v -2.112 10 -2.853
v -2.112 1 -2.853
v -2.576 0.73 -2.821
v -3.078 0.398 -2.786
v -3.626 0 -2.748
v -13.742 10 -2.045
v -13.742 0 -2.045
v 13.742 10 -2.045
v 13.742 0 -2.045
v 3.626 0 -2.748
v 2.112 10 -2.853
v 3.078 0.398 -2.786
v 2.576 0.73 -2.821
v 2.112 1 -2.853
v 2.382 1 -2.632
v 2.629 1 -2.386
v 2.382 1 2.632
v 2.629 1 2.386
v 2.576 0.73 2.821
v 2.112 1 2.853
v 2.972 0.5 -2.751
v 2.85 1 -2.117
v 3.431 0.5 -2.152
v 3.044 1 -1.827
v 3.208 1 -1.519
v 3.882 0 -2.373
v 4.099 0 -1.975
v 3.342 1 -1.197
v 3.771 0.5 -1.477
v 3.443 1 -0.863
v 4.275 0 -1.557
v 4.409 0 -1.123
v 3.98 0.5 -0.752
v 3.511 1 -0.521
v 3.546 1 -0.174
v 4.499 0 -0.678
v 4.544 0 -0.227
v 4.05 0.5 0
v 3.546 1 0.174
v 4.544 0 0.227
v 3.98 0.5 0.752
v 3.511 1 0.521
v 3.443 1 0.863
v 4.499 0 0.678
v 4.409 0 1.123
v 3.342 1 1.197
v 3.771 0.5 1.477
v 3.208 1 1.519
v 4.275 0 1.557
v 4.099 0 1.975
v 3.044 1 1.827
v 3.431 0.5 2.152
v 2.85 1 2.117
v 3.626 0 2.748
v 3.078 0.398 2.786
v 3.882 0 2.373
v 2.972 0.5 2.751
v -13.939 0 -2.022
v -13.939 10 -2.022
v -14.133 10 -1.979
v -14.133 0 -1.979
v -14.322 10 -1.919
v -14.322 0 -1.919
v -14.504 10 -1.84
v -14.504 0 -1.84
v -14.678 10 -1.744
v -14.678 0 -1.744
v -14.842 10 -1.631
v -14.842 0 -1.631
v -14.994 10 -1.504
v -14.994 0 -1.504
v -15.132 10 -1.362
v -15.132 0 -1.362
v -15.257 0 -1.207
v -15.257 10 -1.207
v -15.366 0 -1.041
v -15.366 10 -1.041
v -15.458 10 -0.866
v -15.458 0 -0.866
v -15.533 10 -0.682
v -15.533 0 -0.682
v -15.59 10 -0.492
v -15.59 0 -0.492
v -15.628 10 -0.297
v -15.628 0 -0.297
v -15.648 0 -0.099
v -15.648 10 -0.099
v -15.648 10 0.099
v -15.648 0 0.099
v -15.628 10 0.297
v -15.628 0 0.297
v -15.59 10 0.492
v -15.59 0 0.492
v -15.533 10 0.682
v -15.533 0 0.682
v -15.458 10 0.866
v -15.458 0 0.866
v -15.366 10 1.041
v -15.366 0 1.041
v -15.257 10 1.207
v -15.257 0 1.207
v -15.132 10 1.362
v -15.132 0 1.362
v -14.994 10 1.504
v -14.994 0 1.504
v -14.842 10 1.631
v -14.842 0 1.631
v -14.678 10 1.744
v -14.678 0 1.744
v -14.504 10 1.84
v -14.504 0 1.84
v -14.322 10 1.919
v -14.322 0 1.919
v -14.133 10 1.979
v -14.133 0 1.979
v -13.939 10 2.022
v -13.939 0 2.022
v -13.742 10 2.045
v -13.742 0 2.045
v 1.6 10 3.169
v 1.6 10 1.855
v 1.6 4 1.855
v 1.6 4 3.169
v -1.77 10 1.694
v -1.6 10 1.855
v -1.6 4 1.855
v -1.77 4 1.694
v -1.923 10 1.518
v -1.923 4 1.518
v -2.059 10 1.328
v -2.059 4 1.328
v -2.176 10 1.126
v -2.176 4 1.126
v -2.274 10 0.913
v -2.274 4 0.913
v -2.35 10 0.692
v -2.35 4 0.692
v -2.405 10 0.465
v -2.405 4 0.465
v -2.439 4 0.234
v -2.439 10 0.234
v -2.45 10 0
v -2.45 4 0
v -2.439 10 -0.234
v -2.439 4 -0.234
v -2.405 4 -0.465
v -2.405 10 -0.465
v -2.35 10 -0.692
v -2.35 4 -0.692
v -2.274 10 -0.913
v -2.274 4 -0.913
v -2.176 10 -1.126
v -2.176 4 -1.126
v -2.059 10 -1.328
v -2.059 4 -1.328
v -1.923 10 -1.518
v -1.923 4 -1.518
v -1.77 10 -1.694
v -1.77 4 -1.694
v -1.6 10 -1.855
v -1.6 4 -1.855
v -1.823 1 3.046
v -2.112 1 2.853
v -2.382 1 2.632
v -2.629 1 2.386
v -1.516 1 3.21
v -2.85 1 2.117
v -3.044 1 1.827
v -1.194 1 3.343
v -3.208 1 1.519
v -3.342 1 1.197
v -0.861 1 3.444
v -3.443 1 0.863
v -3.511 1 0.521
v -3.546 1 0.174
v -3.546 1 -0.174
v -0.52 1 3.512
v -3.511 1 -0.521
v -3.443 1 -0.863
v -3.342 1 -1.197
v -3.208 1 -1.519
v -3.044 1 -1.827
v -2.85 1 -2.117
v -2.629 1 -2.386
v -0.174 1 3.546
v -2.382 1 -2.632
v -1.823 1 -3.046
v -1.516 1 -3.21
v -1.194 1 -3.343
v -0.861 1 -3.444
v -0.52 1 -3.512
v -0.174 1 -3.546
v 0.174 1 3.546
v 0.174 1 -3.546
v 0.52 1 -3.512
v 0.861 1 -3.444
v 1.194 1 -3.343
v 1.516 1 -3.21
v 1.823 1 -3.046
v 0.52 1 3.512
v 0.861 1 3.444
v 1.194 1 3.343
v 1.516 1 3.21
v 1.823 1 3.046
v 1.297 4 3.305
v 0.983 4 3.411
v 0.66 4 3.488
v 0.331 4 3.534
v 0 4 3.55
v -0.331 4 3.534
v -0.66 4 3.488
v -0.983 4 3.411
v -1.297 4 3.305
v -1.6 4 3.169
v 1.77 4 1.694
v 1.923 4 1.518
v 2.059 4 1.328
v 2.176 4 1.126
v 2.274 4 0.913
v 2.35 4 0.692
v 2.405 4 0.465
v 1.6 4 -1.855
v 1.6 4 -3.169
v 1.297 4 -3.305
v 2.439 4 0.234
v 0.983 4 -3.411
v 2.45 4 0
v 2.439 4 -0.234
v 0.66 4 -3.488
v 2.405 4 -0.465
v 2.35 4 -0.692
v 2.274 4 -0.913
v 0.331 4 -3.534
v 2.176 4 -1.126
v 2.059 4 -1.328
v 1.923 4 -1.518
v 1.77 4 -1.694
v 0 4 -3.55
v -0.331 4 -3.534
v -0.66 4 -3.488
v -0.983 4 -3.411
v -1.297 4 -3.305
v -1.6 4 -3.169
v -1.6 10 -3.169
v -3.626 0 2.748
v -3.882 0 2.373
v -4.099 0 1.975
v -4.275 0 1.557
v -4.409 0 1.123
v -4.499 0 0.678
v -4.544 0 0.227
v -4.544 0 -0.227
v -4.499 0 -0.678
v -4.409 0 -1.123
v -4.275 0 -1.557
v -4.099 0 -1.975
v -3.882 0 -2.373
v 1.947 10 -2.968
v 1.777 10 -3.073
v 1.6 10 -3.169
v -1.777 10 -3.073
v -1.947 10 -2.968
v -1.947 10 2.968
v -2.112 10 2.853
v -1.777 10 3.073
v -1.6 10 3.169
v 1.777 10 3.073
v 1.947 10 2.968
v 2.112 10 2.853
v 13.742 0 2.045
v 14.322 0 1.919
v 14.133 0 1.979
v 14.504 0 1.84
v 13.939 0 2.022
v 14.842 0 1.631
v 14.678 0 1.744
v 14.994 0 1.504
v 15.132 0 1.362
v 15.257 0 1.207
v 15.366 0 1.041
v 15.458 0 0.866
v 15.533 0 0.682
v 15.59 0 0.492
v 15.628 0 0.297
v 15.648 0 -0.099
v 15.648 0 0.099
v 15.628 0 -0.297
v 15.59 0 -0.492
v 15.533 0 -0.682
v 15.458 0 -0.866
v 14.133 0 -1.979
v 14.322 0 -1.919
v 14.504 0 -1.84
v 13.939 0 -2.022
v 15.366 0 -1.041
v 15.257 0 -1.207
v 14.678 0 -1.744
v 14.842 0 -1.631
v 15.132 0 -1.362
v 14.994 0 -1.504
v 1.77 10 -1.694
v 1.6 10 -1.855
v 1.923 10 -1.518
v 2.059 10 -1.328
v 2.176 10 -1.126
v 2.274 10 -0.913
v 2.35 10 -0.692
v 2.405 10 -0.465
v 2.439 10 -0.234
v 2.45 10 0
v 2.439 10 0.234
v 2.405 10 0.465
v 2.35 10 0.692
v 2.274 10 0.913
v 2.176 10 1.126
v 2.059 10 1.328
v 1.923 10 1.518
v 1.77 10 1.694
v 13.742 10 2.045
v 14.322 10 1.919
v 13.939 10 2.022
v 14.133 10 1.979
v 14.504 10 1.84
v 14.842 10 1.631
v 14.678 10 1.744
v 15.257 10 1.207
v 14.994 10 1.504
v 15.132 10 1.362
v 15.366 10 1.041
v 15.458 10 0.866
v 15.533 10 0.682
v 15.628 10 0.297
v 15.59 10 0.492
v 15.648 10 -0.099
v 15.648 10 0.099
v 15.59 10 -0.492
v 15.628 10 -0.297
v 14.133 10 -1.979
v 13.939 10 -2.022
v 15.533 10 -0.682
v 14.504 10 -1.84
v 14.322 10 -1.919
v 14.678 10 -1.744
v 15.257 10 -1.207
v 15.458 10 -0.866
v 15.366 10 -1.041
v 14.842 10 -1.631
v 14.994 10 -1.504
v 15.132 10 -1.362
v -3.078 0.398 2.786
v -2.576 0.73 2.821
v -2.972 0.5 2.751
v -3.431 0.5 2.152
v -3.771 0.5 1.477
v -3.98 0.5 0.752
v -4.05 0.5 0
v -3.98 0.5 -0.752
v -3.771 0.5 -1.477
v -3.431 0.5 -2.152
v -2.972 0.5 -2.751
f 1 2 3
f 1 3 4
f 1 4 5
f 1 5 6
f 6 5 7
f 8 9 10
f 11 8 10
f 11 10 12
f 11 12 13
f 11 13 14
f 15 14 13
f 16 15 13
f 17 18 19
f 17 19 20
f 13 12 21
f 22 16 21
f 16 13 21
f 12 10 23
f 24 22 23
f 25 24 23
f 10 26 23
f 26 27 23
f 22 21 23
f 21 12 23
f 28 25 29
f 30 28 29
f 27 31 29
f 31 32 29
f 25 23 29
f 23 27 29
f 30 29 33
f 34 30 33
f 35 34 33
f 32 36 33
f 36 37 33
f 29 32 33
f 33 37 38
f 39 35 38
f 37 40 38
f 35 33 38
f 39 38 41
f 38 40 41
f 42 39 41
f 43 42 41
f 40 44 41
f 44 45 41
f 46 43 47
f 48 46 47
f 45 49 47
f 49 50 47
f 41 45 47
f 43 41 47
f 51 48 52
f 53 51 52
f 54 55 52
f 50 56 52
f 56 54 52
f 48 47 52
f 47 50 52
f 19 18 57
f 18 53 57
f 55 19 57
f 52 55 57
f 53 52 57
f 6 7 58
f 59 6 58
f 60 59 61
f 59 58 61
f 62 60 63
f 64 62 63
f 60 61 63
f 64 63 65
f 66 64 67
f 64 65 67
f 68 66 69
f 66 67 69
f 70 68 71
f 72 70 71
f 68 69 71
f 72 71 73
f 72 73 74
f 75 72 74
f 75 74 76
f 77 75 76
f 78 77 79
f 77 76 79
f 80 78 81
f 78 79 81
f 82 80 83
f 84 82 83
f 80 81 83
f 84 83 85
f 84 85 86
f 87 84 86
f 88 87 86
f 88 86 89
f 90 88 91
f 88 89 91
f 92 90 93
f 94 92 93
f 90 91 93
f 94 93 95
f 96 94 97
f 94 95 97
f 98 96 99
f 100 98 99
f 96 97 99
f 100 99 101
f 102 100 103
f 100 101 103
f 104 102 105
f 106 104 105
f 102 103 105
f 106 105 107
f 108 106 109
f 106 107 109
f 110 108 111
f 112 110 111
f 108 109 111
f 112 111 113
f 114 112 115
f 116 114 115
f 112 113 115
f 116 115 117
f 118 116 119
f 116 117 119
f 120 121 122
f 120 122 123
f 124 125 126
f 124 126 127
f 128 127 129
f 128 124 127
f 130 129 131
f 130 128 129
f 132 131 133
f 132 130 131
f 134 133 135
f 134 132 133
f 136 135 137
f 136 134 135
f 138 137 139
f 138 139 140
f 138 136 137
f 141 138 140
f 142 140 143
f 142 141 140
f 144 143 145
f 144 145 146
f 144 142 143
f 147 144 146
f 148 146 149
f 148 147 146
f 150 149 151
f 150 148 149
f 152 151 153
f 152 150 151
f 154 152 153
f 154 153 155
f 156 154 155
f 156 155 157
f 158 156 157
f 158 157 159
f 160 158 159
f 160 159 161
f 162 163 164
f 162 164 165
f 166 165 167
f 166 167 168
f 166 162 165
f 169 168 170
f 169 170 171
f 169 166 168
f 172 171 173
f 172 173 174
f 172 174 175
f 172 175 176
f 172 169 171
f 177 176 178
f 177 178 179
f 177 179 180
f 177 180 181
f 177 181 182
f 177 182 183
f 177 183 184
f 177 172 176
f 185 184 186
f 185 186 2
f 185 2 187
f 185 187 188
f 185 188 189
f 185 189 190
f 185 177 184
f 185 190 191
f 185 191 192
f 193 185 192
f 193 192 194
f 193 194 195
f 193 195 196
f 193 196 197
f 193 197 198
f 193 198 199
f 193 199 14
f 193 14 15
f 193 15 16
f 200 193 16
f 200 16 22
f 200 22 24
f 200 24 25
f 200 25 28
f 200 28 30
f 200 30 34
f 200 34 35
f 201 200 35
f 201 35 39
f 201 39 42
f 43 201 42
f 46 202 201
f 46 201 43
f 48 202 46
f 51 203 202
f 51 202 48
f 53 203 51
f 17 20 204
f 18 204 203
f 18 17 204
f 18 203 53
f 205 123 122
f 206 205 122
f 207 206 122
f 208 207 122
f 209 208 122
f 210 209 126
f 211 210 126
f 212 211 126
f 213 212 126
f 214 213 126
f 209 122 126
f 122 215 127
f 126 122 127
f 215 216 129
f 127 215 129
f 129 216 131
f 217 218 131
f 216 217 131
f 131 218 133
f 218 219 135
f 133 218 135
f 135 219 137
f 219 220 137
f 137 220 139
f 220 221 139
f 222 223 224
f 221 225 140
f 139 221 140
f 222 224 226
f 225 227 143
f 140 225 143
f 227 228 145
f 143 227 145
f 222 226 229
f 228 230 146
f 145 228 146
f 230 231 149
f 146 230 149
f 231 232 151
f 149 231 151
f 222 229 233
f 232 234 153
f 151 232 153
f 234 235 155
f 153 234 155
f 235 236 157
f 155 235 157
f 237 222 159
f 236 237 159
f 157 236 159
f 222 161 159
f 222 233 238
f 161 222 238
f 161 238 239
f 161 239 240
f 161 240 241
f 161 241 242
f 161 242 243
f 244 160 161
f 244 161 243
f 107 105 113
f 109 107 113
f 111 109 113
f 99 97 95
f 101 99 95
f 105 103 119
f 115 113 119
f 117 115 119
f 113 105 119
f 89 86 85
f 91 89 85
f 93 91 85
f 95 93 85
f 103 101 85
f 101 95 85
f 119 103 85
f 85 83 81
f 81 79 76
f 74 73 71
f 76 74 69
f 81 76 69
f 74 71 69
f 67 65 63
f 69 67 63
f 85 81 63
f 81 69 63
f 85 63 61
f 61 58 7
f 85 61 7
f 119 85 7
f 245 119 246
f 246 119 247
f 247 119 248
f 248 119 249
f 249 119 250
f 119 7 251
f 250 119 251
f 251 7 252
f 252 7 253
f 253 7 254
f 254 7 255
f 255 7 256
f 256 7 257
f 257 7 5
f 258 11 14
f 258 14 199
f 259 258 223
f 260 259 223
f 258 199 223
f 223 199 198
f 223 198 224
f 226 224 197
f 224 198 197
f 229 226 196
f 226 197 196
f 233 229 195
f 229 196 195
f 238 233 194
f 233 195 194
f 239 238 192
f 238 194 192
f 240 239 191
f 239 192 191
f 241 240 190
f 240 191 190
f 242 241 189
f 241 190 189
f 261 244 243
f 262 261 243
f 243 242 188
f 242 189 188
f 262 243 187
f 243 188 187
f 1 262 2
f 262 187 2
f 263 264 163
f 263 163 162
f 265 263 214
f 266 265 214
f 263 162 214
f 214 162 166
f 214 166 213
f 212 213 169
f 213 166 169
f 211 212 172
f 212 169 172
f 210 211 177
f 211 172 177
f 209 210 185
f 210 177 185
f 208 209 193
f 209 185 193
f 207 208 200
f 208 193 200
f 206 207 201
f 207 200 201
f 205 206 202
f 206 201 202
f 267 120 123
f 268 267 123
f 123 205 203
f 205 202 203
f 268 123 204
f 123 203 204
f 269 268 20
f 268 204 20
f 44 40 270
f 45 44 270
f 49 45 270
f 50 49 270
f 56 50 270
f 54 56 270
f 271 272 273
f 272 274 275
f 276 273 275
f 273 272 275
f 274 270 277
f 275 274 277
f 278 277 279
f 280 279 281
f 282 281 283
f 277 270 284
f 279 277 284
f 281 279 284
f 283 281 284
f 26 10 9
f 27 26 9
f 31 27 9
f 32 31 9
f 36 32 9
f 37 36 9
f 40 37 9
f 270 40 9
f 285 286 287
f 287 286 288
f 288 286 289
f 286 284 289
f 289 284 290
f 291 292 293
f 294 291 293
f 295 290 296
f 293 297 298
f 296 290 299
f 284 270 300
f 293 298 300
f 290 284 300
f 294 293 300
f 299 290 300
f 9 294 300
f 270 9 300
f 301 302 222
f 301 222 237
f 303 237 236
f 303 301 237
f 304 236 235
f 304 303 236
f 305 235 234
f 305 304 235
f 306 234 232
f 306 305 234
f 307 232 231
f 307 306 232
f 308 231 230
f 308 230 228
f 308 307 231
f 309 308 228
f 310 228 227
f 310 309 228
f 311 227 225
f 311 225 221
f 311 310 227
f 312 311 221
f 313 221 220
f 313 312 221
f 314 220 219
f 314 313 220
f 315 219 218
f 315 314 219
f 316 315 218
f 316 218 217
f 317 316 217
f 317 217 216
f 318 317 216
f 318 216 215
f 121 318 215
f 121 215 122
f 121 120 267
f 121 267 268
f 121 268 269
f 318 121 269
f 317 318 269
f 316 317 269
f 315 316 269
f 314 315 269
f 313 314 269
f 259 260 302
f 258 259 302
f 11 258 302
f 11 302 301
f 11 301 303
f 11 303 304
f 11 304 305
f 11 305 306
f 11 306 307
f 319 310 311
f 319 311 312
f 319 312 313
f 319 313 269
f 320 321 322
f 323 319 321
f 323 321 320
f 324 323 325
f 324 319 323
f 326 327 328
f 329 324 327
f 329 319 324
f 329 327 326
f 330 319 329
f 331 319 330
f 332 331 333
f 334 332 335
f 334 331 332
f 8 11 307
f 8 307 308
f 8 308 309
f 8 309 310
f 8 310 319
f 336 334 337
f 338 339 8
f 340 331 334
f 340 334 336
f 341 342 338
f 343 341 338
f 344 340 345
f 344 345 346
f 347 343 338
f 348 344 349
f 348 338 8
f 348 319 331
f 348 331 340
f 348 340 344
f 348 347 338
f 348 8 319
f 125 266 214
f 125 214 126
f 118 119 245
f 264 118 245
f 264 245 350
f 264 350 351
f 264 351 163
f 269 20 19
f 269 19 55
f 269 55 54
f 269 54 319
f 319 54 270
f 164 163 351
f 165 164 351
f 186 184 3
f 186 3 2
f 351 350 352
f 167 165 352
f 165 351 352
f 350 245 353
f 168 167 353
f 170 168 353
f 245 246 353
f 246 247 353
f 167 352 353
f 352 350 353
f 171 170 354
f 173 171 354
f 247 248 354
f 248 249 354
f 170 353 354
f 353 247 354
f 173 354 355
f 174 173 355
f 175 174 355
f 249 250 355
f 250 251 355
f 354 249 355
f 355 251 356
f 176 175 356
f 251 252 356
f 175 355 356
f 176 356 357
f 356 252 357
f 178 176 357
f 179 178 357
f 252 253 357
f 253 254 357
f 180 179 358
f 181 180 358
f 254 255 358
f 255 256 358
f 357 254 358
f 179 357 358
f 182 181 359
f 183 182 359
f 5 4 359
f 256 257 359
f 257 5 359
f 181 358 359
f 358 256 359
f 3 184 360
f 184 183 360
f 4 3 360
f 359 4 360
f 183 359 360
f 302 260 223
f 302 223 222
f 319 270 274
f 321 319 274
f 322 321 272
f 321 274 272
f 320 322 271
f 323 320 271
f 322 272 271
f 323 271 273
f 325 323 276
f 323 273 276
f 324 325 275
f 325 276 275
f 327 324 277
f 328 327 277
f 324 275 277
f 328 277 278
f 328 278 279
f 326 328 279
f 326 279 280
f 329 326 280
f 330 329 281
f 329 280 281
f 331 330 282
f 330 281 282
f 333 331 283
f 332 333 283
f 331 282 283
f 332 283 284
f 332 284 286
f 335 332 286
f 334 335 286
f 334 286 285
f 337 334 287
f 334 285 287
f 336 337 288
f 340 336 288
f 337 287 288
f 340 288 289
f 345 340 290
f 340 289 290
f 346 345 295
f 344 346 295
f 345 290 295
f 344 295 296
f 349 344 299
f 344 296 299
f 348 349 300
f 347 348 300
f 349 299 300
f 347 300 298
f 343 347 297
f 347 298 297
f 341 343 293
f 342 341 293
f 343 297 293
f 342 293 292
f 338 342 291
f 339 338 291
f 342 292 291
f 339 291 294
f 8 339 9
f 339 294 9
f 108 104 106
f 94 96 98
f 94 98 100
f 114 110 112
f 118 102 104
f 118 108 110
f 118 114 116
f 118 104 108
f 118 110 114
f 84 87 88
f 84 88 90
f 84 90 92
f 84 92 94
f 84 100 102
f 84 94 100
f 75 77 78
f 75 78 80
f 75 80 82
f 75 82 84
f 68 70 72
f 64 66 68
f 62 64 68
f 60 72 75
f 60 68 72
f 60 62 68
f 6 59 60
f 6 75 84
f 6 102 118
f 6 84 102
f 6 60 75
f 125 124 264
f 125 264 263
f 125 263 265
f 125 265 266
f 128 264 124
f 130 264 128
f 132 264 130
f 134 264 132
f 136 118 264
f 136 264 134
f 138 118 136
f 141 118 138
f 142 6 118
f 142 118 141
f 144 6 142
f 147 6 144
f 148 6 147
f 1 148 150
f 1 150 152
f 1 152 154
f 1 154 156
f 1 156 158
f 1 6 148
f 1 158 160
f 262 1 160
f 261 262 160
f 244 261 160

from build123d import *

# Parameters (mm, degrees)
BOSS_EXTRUDE1_DEPTH = 10
CUT_EXTRUDE1_DEPTH  = 1
CHAMFER1_SIZE       = 1
CUT_EXTRUDE2_DEPTH  = 6


with BuildPart() as part:
    # Sketch2 → Boss-Extrude1 (new body)
    with BuildSketch(Plane(origin=(0, 0, 0), x_dir=(1, 0, 0), z_dir=(0, 1, 0))):
        with BuildLine():
            Line((-13.742133053, -2.045066795), (-2.112067201, -2.853361551))
            ThreePointArc((-2.112067201, -2.853361551), (0, -3.55), (2.112067201, -2.853361551))
            Line((2.112067201, -2.853361551), (13.742133053, -2.045066795))
            ThreePointArc((13.742133053, -2.045066795), (15.65, 0), (13.742133053, 2.045066795))
            Line((13.742133053, 2.045066795), (2.112067201, 2.853361551))
            ThreePointArc((2.112067201, 2.853361551), (0, 3.55), (-2.112067201, 2.853361551))
            Line((-2.112067201, 2.853361551), (-13.742133053, 2.045066795))
            ThreePointArc((-13.742133053, 2.045066795), (-15.65, 0), (-13.742133053, -2.045066795))
        make_face()
    extrude(amount=BOSS_EXTRUDE1_DEPTH)

    # Sketch3 → Cut-Extrude1 (cut)
    with BuildSketch(Plane.XZ):
        with BuildLine():
            ThreePointArc((-2.112067201, 2.853361551), (0, -3.55), (2.112067201, 2.853361551))
            ThreePointArc((2.112067201, 2.853361551), (0, 3.55), (-2.112067201, 2.853361551))
        make_face()
    extrude(amount=-CUT_EXTRUDE1_DEPTH, mode=Mode.SUBTRACT)

    # Chamfer1
    chamfer1_edges = [part.edges().sort_by_distance(p)[0] for p in [
        (3.55, 0, 0),
        (-3.55, 0, 0),
    ]]
    chamfer(chamfer1_edges, length=CHAMFER1_SIZE - 0.0001)  # a hair under: the kernel refuses the full size

    # Shaft Key → Cut-Extrude2 (cut)
    with BuildSketch(Plane(origin=(0, 10, 0), x_dir=(1, 0, 0), z_dir=(0, 1, 0))):
        with BuildLine():
            Line((1.6, -1.855397532), (1.6, -5.45))
            Line((1.6, -5.45), (-1.6, -5.45))
            Line((-1.6, -5.45), (-1.6, -1.855397532))
            ThreePointArc((-1.6, -1.855397532), (-2.45, 0), (-1.6, 1.855397532))
            Line((-1.6, 1.855397532), (-1.6, 5.45))
            Line((-1.6, 5.45), (1.6, 5.45))
            Line((1.6, 5.45), (1.6, 1.855397532))
            ThreePointArc((1.6, 1.855397532), (2.45, 0), (1.6, -1.855397532))
        make_face()
    extrude(amount=-CUT_EXTRUDE2_DEPTH, mode=Mode.SUBTRACT)


solid = part.part
